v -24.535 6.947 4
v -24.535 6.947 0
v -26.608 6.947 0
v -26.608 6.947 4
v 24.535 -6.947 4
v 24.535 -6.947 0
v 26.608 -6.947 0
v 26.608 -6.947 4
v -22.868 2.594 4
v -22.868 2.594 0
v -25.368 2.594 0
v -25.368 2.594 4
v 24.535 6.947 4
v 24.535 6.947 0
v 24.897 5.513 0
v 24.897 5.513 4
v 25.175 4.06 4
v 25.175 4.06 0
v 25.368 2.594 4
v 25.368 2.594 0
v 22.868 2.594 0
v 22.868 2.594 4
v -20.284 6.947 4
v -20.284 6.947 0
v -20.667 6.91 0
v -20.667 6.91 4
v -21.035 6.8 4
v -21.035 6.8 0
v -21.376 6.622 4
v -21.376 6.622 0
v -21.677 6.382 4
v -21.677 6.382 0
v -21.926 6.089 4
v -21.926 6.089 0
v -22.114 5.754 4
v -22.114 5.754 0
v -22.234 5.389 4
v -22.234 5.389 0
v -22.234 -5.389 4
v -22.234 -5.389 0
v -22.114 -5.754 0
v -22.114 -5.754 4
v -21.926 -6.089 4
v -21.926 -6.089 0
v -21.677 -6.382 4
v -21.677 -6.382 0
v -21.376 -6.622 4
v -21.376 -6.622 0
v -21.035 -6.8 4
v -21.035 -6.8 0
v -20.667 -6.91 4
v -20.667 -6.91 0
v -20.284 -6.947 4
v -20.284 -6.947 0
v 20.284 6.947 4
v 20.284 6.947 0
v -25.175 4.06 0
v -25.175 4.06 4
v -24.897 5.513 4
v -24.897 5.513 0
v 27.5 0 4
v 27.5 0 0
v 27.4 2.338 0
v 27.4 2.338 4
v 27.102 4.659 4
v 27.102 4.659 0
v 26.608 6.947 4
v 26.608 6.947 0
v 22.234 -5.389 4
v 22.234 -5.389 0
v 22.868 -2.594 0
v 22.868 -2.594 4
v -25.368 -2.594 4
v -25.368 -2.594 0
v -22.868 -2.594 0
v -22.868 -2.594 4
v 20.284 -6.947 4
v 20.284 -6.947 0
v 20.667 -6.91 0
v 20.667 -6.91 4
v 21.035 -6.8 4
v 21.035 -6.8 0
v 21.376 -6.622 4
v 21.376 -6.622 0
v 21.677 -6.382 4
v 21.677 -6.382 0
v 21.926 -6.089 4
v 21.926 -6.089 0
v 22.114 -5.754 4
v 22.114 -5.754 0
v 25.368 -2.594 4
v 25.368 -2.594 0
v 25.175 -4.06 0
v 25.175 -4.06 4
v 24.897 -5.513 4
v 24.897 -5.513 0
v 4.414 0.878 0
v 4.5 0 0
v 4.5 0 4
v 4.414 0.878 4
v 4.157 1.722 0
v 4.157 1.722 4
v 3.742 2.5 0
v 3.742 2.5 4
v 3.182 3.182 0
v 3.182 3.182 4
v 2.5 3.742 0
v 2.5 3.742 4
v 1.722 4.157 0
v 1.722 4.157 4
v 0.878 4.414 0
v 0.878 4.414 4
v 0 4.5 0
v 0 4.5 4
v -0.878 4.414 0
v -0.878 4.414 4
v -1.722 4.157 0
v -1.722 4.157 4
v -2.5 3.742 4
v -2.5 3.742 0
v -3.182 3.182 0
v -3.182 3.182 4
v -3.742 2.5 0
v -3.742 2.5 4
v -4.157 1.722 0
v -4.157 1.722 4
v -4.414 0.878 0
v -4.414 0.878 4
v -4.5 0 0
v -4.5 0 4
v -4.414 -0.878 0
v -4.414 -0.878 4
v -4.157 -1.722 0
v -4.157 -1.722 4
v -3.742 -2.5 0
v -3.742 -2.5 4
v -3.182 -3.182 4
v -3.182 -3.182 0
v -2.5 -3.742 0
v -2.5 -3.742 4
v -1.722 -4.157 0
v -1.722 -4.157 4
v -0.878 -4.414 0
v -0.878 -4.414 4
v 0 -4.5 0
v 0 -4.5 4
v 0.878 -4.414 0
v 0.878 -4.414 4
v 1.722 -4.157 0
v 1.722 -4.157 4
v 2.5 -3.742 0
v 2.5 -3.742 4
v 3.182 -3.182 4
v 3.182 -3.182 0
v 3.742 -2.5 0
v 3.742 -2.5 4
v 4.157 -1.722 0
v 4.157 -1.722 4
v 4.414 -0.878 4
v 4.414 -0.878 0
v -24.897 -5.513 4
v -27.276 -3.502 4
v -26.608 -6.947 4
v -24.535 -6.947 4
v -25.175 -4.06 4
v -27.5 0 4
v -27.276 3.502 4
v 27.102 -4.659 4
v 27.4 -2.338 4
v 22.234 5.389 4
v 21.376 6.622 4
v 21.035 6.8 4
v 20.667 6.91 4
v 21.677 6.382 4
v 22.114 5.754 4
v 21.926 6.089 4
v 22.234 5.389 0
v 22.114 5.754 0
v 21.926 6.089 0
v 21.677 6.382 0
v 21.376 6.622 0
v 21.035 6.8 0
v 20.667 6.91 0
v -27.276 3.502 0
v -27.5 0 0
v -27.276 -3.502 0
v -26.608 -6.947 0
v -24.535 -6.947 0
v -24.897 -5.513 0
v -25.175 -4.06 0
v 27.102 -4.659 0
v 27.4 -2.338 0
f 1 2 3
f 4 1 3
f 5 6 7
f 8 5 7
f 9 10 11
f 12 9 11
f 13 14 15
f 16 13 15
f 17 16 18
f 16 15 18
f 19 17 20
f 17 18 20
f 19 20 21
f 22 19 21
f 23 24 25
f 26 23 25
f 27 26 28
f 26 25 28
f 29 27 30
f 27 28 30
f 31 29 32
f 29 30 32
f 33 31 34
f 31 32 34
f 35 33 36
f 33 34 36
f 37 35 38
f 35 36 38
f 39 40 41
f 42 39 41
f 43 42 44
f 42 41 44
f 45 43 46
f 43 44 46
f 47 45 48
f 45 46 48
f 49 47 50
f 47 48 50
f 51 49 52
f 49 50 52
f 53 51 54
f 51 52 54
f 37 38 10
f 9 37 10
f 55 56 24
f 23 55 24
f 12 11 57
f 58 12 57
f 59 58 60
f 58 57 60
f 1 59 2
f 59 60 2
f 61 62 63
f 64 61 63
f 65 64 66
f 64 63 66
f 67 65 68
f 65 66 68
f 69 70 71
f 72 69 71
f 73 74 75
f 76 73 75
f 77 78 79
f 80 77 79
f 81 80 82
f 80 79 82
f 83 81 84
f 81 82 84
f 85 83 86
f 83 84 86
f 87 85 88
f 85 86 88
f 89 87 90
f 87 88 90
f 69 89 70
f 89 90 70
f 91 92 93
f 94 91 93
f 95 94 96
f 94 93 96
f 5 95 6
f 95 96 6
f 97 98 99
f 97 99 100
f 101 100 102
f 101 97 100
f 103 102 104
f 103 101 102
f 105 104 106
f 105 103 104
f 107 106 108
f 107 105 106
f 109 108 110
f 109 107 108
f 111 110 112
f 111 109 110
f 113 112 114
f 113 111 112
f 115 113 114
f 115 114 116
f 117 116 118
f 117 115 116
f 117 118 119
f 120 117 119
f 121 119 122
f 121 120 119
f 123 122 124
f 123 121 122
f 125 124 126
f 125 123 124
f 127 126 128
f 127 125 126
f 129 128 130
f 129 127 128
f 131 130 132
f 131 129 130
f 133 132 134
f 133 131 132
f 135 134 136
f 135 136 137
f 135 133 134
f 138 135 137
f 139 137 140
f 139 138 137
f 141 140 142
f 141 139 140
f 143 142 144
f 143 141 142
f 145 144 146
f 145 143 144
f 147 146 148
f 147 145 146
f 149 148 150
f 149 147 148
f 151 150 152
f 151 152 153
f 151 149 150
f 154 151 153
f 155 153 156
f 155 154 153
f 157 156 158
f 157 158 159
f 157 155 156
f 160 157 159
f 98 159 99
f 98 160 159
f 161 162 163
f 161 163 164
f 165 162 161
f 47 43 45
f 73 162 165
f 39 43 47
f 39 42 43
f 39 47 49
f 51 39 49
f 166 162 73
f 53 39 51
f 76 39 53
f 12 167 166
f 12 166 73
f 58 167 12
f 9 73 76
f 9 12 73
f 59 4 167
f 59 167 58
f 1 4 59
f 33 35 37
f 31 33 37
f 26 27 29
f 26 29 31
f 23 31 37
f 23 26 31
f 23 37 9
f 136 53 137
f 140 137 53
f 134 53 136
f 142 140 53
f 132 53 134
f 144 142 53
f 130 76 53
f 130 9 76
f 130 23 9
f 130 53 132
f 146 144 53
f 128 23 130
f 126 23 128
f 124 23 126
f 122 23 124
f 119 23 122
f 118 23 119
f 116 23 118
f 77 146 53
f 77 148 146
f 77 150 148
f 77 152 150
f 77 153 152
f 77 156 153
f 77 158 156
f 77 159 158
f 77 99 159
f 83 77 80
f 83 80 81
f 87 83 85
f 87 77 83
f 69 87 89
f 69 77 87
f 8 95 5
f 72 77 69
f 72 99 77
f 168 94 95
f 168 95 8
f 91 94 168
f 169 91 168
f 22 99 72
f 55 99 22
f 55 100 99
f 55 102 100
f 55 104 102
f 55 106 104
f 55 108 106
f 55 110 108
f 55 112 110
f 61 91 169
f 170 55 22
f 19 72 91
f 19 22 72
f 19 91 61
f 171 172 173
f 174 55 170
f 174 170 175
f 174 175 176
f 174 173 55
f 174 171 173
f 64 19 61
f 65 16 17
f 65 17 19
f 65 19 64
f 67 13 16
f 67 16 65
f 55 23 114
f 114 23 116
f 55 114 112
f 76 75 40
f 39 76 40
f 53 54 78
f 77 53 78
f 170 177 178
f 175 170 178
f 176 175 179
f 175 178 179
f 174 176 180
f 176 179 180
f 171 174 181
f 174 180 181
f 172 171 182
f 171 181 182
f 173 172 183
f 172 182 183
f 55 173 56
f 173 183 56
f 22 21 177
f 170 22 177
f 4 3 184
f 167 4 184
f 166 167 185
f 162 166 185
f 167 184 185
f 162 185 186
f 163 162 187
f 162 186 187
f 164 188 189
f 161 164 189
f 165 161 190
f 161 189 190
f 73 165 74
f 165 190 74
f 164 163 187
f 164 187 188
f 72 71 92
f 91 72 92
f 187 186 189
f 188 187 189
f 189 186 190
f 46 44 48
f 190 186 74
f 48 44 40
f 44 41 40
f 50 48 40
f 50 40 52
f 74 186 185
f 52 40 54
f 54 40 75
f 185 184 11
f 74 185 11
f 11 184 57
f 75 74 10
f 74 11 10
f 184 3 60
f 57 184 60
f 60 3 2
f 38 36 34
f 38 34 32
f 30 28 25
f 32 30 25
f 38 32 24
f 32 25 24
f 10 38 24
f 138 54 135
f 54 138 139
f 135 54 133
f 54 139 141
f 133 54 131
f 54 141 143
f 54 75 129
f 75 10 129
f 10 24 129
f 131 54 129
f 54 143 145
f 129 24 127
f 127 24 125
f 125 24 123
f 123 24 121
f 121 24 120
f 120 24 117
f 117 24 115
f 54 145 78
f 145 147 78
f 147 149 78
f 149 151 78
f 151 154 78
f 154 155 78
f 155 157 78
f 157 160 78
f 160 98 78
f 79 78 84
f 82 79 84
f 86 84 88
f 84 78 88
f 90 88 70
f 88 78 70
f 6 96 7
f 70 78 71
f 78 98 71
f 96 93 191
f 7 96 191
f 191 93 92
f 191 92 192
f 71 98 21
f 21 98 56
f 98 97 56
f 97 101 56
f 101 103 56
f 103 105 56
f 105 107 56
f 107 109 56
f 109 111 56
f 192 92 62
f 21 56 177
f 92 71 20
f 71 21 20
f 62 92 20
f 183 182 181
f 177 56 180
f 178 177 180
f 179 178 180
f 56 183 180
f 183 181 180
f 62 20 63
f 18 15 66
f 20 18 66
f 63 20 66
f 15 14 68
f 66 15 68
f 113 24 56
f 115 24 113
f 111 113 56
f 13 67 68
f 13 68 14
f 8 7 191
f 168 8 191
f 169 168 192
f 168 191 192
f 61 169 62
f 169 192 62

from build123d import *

# Parameters (mm, degrees)
F0_R     = 4.5
F1_DEPTH = 4


with BuildPart() as f1:
    # F0 (on Top) → F1 (new body)
    with BuildSketch(Plane.XY):
        with BuildLine():
            ThreePointArc((-25.367756, 2.593636), (-25.046378, 4.788421), (-24.535476, 6.946973))
            Line((-24.535476, 6.946973), (-26.608073, 6.946973))
            ThreePointArc((-26.608073, 6.946973), (-27.5, 0), (-26.608073, -6.946973))
            Line((-26.608073, -6.946973), (-24.535476, -6.946973))
            ThreePointArc((-24.535476, -6.946973), (-25.046378, -4.788421), (-25.367756, -2.593636))
            ThreePointArc((-25.367756, -2.593636), (-25.5, 0), (-25.367756, 2.593636))
        make_face()
        with BuildLine():
            ThreePointArc((25.367756, 2.593636), (25.466918, 1.298502), (25.5, 0))
            ThreePointArc((25.5, 0), (25.466918, -1.298502), (25.367756, -2.593636))
            ThreePointArc((25.367756, -2.593636), (25.046378, -4.788421), (24.535476, -6.946973))
            Line((24.535476, -6.946973), (26.608073, -6.946973))
            ThreePointArc((26.608073, -6.946973), (27.276107, -3.501998), (27.5, 0))
            ThreePointArc((27.5, 0), (27.276107, 3.501998), (26.608073, 6.946973))
            Line((26.608073, 6.946973), (24.535476, 6.946973))
            ThreePointArc((24.535476, 6.946973), (25.046378, 4.788421), (25.367756, 2.593636))
        make_face()
        with BuildLine():
            ThreePointArc((25.367756, -2.593636), (25.466918, -1.298502), (25.5, 0))
            ThreePointArc((25.5, 0), (25.466918, 1.298502), (25.367756, 2.593636))
            Line((25.367756, 2.593636), (22.867756, 2.593636))
            Line((22.867756, 2.593636), (22.234436, 5.388908))
            ThreePointArc((22.234436, 5.388908), (21.532098, 6.509642), (20.283874, 6.946973))
            Line((20.283874, 6.946973), (0, 6.946973))
            Line((0, 6.946973), (-20.283874, 6.946973))
            ThreePointArc((-20.283874, 6.946973), (-21.532098, 6.509642), (-22.234436, 5.388908))
            Line((-22.234436, 5.388908), (-22.867756, 2.593636))
            Line((-22.867756, 2.593636), (-25.367756, 2.593636))
            ThreePointArc((-25.367756, 2.593636), (-25.5, 0), (-25.367756, -2.593636))
            Line((-25.367756, -2.593636), (-22.867756, -2.593636))
            Line((-22.867756, -2.593636), (-22.234436, -5.388908))
            ThreePointArc((-22.234436, -5.388908), (-21.532098, -6.509642), (-20.283874, -6.946973))
            Line((-20.283874, -6.946973), (0, -6.946973))
            Line((0, -6.946973), (20.283874, -6.946973))
            ThreePointArc((20.283874, -6.946973), (21.532098, -6.509642), (22.234436, -5.388908))
            Line((22.234436, -5.388908), (22.867756, -2.593636))
            Line((22.867756, -2.593636), (25.367756, -2.593636))
        make_face()
        Circle(F0_R, mode=Mode.SUBTRACT)
    extrude(amount=F1_DEPTH)


solid = f1.part
